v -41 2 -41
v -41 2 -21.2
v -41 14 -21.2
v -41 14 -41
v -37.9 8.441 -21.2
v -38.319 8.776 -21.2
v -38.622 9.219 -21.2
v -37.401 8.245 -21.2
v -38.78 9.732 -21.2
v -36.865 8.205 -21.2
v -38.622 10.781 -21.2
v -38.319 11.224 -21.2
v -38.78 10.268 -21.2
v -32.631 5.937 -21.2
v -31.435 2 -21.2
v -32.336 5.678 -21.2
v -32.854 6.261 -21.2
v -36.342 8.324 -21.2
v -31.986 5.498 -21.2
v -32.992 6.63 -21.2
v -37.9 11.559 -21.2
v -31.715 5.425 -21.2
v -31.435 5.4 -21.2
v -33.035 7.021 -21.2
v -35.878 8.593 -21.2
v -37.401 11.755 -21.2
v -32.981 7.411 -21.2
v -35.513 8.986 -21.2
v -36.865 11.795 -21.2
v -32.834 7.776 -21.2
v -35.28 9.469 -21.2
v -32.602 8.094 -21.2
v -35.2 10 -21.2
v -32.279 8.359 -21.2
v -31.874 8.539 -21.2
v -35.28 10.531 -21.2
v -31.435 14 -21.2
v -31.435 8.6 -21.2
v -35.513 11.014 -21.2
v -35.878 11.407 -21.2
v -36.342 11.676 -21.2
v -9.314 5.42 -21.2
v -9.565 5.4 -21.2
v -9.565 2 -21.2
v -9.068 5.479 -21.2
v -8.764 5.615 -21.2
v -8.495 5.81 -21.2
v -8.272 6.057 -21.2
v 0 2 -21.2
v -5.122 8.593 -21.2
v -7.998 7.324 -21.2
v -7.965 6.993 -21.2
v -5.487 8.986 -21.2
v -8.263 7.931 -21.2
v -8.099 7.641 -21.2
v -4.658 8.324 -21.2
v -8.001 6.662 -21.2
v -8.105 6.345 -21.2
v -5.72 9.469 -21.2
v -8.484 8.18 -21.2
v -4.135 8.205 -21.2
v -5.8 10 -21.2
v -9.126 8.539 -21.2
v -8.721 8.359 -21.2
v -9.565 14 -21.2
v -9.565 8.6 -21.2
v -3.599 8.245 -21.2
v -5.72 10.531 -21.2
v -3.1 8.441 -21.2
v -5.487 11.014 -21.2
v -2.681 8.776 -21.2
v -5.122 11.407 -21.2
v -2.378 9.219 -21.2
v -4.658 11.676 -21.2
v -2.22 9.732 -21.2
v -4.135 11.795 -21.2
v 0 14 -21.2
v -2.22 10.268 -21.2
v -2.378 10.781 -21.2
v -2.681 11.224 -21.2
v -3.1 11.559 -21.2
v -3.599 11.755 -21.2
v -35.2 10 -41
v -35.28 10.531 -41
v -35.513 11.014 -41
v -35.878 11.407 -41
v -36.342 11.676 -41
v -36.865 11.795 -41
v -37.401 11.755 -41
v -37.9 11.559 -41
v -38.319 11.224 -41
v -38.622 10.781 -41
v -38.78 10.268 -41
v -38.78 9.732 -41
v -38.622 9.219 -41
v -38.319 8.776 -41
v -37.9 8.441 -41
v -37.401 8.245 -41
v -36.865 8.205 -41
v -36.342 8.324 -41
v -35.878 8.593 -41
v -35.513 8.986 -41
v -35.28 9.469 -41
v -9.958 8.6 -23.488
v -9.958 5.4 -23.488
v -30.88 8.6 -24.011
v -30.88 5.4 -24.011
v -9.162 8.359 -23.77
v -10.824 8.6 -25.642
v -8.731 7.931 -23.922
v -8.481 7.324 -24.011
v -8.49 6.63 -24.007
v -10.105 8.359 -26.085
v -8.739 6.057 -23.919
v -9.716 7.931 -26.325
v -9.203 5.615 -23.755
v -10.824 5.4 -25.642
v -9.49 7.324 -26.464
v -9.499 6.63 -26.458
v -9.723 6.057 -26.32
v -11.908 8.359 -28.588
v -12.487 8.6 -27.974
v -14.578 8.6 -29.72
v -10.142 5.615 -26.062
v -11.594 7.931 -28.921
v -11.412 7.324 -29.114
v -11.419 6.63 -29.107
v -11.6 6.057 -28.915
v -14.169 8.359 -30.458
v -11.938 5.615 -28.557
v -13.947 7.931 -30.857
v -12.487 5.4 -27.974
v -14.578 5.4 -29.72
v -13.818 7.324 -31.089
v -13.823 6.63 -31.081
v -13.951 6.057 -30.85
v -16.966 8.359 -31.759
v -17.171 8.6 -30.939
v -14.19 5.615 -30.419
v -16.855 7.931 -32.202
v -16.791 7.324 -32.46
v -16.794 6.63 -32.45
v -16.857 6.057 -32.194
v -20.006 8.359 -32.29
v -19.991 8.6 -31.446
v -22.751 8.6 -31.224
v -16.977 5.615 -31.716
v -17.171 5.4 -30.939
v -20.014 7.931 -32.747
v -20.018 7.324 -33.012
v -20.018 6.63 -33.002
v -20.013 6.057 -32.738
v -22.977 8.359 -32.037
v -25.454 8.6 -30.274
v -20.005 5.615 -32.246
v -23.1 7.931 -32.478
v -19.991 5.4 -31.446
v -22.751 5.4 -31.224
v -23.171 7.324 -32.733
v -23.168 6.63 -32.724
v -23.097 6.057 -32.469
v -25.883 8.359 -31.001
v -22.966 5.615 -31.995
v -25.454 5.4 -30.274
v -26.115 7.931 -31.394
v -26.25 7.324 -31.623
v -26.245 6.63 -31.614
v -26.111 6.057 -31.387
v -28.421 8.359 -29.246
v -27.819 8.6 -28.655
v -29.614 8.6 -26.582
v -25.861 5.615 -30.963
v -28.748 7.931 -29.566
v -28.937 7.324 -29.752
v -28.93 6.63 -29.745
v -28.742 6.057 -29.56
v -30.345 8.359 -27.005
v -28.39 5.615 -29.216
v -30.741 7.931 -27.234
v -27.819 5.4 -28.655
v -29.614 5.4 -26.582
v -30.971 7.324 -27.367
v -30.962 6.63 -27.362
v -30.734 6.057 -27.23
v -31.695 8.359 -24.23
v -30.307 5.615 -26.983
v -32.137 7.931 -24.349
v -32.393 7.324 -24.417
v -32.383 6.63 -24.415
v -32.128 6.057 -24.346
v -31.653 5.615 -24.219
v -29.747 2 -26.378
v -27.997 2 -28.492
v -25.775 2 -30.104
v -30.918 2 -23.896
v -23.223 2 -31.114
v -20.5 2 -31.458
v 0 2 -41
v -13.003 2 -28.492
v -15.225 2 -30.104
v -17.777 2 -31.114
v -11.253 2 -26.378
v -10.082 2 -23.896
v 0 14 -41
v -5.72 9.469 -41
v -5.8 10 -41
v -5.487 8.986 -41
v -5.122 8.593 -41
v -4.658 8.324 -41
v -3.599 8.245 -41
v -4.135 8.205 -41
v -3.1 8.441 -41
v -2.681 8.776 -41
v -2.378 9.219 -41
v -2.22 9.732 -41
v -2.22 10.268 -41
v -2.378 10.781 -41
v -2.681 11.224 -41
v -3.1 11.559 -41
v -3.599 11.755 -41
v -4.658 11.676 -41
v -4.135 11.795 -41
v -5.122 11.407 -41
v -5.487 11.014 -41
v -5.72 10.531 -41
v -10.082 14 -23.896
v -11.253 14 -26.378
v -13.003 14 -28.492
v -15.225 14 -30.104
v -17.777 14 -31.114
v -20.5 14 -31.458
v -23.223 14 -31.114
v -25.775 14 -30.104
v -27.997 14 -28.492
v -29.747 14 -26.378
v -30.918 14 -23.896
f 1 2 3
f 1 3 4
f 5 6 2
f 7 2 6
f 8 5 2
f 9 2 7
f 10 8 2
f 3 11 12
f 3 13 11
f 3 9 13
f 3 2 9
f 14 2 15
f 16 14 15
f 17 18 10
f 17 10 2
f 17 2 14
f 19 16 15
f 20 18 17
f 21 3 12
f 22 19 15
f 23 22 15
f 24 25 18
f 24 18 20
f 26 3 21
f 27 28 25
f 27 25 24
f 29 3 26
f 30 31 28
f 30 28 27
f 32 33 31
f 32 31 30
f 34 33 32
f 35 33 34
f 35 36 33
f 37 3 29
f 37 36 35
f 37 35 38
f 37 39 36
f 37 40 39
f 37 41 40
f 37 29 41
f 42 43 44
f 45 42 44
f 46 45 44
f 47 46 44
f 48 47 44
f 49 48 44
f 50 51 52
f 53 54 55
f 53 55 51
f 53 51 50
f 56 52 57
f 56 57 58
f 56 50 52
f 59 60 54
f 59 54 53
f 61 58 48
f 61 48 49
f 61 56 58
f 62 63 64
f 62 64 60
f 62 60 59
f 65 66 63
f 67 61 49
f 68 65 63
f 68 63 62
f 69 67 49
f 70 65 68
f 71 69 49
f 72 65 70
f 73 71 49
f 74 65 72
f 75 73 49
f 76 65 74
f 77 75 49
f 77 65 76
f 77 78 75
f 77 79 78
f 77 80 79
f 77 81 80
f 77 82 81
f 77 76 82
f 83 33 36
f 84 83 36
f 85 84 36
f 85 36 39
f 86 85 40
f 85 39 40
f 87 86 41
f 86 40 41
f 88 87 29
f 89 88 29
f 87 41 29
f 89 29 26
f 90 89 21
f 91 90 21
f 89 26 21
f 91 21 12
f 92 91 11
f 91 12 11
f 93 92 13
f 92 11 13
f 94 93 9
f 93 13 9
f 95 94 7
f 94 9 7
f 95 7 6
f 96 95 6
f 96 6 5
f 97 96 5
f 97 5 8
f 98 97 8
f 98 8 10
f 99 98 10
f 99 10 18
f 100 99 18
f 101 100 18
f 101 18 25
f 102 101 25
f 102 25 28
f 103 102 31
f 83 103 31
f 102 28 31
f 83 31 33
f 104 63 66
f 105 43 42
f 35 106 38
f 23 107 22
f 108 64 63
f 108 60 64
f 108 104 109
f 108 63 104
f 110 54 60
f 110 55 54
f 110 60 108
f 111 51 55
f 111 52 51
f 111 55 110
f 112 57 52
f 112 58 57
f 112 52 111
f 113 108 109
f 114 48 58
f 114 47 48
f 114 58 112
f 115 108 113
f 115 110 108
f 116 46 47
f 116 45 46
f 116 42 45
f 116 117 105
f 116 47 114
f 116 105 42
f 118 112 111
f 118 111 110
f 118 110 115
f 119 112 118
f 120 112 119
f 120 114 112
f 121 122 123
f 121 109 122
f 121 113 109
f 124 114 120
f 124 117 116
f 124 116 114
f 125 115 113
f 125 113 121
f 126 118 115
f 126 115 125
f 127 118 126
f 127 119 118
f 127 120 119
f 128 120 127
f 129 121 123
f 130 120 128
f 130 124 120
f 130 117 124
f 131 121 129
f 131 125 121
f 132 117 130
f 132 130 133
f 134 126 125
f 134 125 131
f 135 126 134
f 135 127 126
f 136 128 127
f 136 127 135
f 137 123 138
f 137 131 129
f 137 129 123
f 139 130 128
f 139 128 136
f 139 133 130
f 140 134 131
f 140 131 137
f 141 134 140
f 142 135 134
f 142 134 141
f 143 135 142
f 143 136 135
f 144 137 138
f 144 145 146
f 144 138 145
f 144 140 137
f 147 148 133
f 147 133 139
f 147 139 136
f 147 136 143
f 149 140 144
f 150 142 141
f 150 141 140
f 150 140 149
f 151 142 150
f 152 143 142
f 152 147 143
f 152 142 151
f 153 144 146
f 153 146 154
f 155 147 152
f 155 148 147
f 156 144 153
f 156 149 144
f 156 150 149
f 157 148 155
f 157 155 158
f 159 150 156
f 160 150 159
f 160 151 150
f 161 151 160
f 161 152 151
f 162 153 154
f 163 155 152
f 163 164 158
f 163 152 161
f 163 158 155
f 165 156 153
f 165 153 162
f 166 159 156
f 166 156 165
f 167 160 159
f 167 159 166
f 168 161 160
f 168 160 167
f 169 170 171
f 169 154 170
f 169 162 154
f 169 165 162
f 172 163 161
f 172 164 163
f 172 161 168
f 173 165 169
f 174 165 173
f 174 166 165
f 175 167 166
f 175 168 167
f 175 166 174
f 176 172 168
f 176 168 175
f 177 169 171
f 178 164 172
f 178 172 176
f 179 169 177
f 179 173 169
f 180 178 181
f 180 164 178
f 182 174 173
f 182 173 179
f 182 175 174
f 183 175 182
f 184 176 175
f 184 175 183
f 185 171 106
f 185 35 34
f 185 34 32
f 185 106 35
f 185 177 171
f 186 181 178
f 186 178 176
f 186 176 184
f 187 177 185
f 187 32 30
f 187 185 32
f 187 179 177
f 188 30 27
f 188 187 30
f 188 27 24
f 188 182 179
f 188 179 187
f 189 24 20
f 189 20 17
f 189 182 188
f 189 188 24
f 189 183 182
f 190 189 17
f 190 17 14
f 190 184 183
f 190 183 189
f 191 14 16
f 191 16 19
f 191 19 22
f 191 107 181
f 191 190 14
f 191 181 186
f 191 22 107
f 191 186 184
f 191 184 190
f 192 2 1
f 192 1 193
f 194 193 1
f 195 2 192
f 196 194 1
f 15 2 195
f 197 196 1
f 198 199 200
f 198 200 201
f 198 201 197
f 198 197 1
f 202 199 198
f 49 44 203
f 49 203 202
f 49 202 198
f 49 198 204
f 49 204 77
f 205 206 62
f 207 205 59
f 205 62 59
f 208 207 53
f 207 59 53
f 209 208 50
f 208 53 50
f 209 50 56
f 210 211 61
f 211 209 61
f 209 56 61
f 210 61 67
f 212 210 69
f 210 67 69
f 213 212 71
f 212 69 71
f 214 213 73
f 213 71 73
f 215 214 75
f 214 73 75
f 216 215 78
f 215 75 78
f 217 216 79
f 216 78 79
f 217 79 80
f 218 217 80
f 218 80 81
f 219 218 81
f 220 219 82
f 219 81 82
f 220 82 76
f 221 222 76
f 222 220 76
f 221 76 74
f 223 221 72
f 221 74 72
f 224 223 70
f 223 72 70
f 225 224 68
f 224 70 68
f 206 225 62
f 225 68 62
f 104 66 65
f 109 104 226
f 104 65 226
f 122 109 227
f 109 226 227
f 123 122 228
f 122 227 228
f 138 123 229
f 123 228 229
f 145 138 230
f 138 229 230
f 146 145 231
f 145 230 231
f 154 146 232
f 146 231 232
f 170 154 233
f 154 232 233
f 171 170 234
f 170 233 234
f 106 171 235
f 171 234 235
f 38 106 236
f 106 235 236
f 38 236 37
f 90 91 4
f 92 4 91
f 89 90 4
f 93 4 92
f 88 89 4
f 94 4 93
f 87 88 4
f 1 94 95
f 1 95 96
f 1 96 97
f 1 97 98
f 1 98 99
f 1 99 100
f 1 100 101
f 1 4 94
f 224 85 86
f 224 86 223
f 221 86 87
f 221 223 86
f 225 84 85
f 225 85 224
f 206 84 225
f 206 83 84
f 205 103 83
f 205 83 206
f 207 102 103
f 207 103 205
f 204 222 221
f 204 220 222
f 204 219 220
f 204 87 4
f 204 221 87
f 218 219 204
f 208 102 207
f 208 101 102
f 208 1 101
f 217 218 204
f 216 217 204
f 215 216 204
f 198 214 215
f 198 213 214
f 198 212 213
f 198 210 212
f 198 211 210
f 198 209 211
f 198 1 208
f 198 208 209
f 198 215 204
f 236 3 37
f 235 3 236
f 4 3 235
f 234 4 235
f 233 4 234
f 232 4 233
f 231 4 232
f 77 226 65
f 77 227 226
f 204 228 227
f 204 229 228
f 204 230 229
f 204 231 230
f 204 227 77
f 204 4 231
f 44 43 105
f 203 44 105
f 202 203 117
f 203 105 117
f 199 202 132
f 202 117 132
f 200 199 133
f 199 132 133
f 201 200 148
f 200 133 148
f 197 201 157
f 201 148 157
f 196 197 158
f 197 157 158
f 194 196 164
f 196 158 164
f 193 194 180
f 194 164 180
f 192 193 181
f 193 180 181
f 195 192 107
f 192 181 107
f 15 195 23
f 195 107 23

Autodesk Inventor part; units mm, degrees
ref_plane "YZ Plane" through (0, 0, 0) normal (1, 0, 0) x (0, 1, 0)
ref_plane "XZ Plane" through (0, 0, 0) normal (0, 1, 0) x (-1, 0, 0)
sketch "Sketch1" plane through (0, 0, 0) normal (0, 1, 0) x (-1, 0, 0)
  line L0 (0, 0) -> (41, 0)
  line L1 (41, 0) -> (41, -41)
  line L2 (41, -41) -> (0, -41)
  line L3 (0, -41) -> (0, 0)
  dimension "d0" = 41
  dimension "d1" = 41
extrude "Extrusion1" add sketch "Sketch1" along normal blind 9.5
sketch "Sketch3" plane through (0, 9.5, 0) normal (0, 1, 0) x (1, 0, 0)
  circle A0 centre (-20.5, 20.5) radius 10
  point P0 (0, 0)
  dimension "d5" = 20
extrude "Extrusion2" cut sketch "Sketch3" against normal blind 10
sketch "Sketch4" plane through (0, 9.5, 0) normal (0, 1, 0) x (1, 0, 0)
  circle A0 centre (-20.5, 20.5) radius 10 projected
  circle A1 centre (-20.5, 20.5) radius 11.75
  point P0 (0, 0)
  dimension "d8" = 23.5
extrude "Extrusion3" cut sketch "Sketch4" against normal blind 5
sketch "Sketch5" plane through (0, 9.5, 0) normal (0, 1, 0) x (1, 0, 0)
  line L0 (-41, 41) -> (-41, 0) projected
  line L1 (-41, 0) -> (0, 0)
  line L2 (0, 0) -> (0, 41)
  line L3 (0, 41) -> (-41, 41)
  line L4 (-41, 41) -> (-41, 0)
  circle A0 centre (-20.5, 20.5) radius 11.75 projected
  circle A1 centre (-20.5, 20.5) radius 10
extrude "Extrusion4" add sketch "Sketch5" along normal blind 4.5 contours L3 L2 L1 L0 | A0
sketch "Sketch6" plane through (-41, 0, 0) normal (0, 0, 1) x (1, 0, 0)
  line L0 (0, 0) -> (0, 14) projected
  line L1 (0, 14) -> (41, 14)
  line L2 (41, 14) -> (41, 0)
  line L3 (41, 0) -> (0, 0)
  line L4 (0, 0) -> (0, 14)
extrude "Extrusion5" cut sketch "Sketch6" against normal blind 20.5
sketch "Sketch8" plane through (-41, 0, -20.5) normal (0, 0, 1) x (1, 0, 0)
  circle A0 centre (4, 10) radius 1.8
  point P0 (41, 0)
  dimension "d15" = 3.6
extrude "Extrusion6" cut sketch "Sketch8" against normal blind 20.5
ref_plane "Work Plane1" through (-20.5, 0, -41) normal (1, 0, 0) x (0, 0, -1)
mirror "Mirror1" about plane through (-20.5, 0, -41) normal (1, 0, 0) of "Extrusion6"
sketch "Sketch9" plane through (-41, 0, -20.5) normal (0, 0, 1) x (1, 0, 0)
  line L0 (10.5, 14) -> (10.5, 9.5) projected
  line L1 (8.75, 4.5) -> (10.5, 4.5) projected
  line L2 (10.5, 9.5) -> (8.75, 9.5)
  line L3 (8.75, 9.5) -> (8.75, 4.5)
  line L4 (8.75, 4.5) -> (10.5, 4.5)
  line L5 (10.5, 4.5) -> (10.5, 9.5)
  point P0 (41, 0)
sketch "Sketch11" plane through (0, 4.5, 0) normal (0, 1, 0) x (1, 0, 0)
  arc A0 (-10.5, 20.5) -> (-30.5, 20.5) centre (-20.5, 20.5) ccw projected
  arc A1 (-9.625, 20.5) -> (-31.375, 20.5) centre (-20.5, 20.5) ccw
  line L0 (-41, 41) -> (-41, 20.5) projected
  point P0 (0, 0)
sweep "Sweep1" add profiles "Sketch9" path "Sketch11" path curves A1
sketch "Sketch12" plane through (-41, 0, -20.5) normal (0, 0, 1) x (1, 0, 0)
  line L0 (10.5, 14) -> (10.5, 0) projected
  circle A0 centre (10.5, 7) radius 1.6
  point P0 (41, 0)
  dimension "d21" = 3.2
sketch3d "3D Sketch1"
  arc A0 (-30.5, 14, -20.5) -> (-27.5711, 14, -27.5711) centre (-20.5, 14, -20.5) ccw
  arc A1 (-27.5711, 14, -27.5711) -> (-20.5, 14, -30.5) centre (-20.5, 14, -20.5) ccw
  arc A2 (-20.5, 14, -30.5) -> (-13.4289, 14, -27.5711) centre (-20.5, 14, -20.5) ccw
  arc A3 (-13.4289, 14, -27.5711) -> (-10.5, 14, -20.5) centre (-20.5, 14, -20.5) ccw
sweep "Sweep2" cut profiles "Sketch12" path "3D Sketch1"
sketch "Sketch13" plane through (0, 0, 0) normal (0, -1, 0) x (1, 0, 0)
  line L0 (-53.975, -9.525) -> (46.0375, -9.525)
  line L1 (46.0375, -9.525) -> (46.0375, -71.4375)
  line L2 (46.0375, -71.4375) -> (-53.975, -71.4375)
  line L3 (-53.975, -71.4375) -> (-53.975, -9.525)
  point P0 (0, 0)
extrude "Extrusion7" cut sketch "Sketch13" against normal blind 2
sketch "Sketch14" plane through (-41, 0, -20.5) normal (0, 0, 1) x (1, 0, 0)
  line L0 (-1.5875, 15.875) -> (46.0375, 15.875)
  line L1 (46.0375, 15.875) -> (46.0375, -1.5875)
  line L2 (46.0375, -1.5875) -> (-1.5875, -1.5875)
  line L3 (-1.5875, -1.5875) -> (-1.5875, 15.875)
  point P0 (41, 0)
extrude "Extrusion8" cut sketch "Sketch14" against normal blind 0.7
sketch "Sketch15" plane through (0, 14, 0) normal (0, 1, 0) x (1, 0, 0)
  arc A0 (-10.5245, 21.2) -> (-30.4755, 21.2) centre (-20.5, 20.5) ccw projected
  circle A1 centre (-20.5, 20.5) radius 10.9575
  point P0 (0, 0)
  dimension "d28" = 21.915
extrude "Extrusion9" cut sketch "Sketch15" against normal blind 15
sketch "Sketch18" plane through (-41, 0, -21.2) normal (0, 0, 1) x (1, 0, 0)
  point P0 (41, 0)
sketch "Sketch19" plane through (-41, 0, -21.2) normal (0, 0, 1) x (1, 0, 0)
  circle A0 centre (9.5649, 7) radius 1.6
  point P0 (41, 0)
  dimension "d34" = 3.2
sketch "Sketch20" plane through (0, 14, 0) normal (0, 1, 0) x (1, 0, 0)
  arc A0 (-9.5649, 21.2) -> (-31.4351, 21.2) centre (-20.5, 20.5) ccw projected
  circle A1 centre (-20.5, 20.5) radius 10.9575
  point P0 (0, 0)
sweep "Sweep4" cut profiles "Sketch19" path "Sketch20" path curves A1
properties part number "8.1 peristaltic pump lid 3mm"
